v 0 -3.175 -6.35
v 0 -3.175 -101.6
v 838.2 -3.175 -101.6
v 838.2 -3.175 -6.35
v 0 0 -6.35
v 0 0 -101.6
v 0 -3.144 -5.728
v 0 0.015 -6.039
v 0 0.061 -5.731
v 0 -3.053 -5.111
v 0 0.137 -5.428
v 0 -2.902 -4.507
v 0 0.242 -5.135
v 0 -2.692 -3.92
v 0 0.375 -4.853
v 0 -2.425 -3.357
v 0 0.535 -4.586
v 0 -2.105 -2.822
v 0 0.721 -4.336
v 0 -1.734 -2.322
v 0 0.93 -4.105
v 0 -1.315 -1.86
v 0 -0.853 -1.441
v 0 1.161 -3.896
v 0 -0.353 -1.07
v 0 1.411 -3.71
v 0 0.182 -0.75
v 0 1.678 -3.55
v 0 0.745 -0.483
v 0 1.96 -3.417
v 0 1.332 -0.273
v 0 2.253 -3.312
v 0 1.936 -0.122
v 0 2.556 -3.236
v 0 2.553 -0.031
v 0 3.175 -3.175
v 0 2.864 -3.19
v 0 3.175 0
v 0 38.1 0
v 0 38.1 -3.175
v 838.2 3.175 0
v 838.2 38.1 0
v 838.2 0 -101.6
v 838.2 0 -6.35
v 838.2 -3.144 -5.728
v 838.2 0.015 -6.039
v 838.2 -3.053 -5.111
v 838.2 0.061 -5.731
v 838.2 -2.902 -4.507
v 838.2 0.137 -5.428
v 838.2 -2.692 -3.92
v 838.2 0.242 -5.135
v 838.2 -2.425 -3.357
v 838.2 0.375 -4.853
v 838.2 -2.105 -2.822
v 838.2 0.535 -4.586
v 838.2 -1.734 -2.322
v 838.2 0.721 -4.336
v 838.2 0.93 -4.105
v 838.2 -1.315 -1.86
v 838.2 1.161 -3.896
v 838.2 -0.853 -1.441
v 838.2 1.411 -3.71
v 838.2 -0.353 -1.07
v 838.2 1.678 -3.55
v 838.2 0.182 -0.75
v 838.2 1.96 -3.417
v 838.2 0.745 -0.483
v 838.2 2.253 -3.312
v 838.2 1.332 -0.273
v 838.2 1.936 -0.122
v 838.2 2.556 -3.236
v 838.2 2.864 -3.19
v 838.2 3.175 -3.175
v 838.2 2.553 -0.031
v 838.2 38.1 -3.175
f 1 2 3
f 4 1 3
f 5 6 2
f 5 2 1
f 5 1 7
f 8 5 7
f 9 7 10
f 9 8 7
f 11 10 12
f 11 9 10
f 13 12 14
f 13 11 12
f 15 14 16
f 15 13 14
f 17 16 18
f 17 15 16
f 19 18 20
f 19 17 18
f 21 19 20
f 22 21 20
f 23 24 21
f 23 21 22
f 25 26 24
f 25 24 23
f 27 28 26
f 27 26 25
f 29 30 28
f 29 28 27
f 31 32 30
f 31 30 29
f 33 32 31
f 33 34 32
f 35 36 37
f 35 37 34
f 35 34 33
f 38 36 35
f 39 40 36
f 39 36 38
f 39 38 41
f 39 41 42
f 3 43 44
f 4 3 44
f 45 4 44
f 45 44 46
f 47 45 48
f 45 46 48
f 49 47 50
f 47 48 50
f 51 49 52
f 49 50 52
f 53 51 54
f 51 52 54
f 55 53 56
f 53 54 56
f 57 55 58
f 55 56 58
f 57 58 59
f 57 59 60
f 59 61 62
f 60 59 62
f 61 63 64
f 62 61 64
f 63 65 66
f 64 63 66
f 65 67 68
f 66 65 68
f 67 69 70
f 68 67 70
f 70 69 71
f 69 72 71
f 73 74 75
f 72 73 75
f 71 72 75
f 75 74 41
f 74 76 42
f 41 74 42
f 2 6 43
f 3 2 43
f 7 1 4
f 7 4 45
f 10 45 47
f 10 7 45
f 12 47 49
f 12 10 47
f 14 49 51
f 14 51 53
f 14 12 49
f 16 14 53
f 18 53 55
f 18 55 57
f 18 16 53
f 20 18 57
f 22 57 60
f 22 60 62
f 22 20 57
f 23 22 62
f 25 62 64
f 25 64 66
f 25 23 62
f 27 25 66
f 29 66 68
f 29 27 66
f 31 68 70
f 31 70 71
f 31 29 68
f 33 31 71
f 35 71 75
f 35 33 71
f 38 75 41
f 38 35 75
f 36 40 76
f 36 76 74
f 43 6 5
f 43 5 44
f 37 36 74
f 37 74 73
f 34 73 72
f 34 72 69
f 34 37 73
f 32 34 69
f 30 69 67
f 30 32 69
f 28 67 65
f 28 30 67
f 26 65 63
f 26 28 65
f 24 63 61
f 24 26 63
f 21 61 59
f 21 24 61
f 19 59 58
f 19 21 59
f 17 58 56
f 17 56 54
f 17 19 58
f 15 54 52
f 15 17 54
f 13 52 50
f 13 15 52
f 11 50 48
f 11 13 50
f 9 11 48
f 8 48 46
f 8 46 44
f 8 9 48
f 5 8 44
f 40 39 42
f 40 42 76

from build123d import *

# Parameters (mm, degrees)
SKETCH1_W                    = 838.2
SKETCH1_H                    = 101.6
BASE_FLANGE1_DEPTH           = 3.175
EDGE_FLANGE1_STRIP_W         = 19.05
EDGE_FLANGE1_STRIP_H         = 3.175
EDGE_FLANGE1_STRIP_CUT_DEPTH = 838.2
EDGE_FLANGE1_DEPTH           = 838.2


# Sheet-metal steps are written as plain solids
with BuildPart() as part:
    # Sketch1 → Base-Flange1 (new body)
    with BuildSketch(Plane(origin=(0, 0, 0), x_dir=(1, 0, 0), z_dir=(0, 1, 0))):
        with Locations((419.1, 50.8)):
            Rectangle(SKETCH1_W, SKETCH1_H)
    extrude(amount=-BASE_FLANGE1_DEPTH)

    # Edge-Flange1 strip (across the edge) → Edge-Flange1 strip cut (cut)
    with BuildSketch(Plane(origin=(0, 0, 0), x_dir=(0, 0, -1), z_dir=(1, 0, 0))):
        with Locations((-3.175, -1.5875)):
            Rectangle(EDGE_FLANGE1_STRIP_W, EDGE_FLANGE1_STRIP_H)
    extrude(amount=EDGE_FLANGE1_STRIP_CUT_DEPTH, mode=Mode.SUBTRACT)

    # Edge-Flange1 section (across the edge) → Edge-Flange1 (add)
    with BuildSketch(Plane(origin=(0, 0, 0), x_dir=(0, 0, -1), z_dir=(1, 0, 0))):
        with BuildLine():
            Line((0, 3.175), (0, 38.1))
            Line((0, 38.1), (3.175, 38.1))
            Line((3.175, 38.1), (3.175, 3.175))
            ThreePointArc((3.175, 3.175), (4.10493597, 0.92993597), (6.35, 0))
            Line((6.35, 0), (6.35, -3.175))
            ThreePointArc((6.35, -3.175), (1.859871939, -1.315128061), (0, 3.175))
        make_face()
    extrude(amount=EDGE_FLANGE1_DEPTH)


solid = part.part
